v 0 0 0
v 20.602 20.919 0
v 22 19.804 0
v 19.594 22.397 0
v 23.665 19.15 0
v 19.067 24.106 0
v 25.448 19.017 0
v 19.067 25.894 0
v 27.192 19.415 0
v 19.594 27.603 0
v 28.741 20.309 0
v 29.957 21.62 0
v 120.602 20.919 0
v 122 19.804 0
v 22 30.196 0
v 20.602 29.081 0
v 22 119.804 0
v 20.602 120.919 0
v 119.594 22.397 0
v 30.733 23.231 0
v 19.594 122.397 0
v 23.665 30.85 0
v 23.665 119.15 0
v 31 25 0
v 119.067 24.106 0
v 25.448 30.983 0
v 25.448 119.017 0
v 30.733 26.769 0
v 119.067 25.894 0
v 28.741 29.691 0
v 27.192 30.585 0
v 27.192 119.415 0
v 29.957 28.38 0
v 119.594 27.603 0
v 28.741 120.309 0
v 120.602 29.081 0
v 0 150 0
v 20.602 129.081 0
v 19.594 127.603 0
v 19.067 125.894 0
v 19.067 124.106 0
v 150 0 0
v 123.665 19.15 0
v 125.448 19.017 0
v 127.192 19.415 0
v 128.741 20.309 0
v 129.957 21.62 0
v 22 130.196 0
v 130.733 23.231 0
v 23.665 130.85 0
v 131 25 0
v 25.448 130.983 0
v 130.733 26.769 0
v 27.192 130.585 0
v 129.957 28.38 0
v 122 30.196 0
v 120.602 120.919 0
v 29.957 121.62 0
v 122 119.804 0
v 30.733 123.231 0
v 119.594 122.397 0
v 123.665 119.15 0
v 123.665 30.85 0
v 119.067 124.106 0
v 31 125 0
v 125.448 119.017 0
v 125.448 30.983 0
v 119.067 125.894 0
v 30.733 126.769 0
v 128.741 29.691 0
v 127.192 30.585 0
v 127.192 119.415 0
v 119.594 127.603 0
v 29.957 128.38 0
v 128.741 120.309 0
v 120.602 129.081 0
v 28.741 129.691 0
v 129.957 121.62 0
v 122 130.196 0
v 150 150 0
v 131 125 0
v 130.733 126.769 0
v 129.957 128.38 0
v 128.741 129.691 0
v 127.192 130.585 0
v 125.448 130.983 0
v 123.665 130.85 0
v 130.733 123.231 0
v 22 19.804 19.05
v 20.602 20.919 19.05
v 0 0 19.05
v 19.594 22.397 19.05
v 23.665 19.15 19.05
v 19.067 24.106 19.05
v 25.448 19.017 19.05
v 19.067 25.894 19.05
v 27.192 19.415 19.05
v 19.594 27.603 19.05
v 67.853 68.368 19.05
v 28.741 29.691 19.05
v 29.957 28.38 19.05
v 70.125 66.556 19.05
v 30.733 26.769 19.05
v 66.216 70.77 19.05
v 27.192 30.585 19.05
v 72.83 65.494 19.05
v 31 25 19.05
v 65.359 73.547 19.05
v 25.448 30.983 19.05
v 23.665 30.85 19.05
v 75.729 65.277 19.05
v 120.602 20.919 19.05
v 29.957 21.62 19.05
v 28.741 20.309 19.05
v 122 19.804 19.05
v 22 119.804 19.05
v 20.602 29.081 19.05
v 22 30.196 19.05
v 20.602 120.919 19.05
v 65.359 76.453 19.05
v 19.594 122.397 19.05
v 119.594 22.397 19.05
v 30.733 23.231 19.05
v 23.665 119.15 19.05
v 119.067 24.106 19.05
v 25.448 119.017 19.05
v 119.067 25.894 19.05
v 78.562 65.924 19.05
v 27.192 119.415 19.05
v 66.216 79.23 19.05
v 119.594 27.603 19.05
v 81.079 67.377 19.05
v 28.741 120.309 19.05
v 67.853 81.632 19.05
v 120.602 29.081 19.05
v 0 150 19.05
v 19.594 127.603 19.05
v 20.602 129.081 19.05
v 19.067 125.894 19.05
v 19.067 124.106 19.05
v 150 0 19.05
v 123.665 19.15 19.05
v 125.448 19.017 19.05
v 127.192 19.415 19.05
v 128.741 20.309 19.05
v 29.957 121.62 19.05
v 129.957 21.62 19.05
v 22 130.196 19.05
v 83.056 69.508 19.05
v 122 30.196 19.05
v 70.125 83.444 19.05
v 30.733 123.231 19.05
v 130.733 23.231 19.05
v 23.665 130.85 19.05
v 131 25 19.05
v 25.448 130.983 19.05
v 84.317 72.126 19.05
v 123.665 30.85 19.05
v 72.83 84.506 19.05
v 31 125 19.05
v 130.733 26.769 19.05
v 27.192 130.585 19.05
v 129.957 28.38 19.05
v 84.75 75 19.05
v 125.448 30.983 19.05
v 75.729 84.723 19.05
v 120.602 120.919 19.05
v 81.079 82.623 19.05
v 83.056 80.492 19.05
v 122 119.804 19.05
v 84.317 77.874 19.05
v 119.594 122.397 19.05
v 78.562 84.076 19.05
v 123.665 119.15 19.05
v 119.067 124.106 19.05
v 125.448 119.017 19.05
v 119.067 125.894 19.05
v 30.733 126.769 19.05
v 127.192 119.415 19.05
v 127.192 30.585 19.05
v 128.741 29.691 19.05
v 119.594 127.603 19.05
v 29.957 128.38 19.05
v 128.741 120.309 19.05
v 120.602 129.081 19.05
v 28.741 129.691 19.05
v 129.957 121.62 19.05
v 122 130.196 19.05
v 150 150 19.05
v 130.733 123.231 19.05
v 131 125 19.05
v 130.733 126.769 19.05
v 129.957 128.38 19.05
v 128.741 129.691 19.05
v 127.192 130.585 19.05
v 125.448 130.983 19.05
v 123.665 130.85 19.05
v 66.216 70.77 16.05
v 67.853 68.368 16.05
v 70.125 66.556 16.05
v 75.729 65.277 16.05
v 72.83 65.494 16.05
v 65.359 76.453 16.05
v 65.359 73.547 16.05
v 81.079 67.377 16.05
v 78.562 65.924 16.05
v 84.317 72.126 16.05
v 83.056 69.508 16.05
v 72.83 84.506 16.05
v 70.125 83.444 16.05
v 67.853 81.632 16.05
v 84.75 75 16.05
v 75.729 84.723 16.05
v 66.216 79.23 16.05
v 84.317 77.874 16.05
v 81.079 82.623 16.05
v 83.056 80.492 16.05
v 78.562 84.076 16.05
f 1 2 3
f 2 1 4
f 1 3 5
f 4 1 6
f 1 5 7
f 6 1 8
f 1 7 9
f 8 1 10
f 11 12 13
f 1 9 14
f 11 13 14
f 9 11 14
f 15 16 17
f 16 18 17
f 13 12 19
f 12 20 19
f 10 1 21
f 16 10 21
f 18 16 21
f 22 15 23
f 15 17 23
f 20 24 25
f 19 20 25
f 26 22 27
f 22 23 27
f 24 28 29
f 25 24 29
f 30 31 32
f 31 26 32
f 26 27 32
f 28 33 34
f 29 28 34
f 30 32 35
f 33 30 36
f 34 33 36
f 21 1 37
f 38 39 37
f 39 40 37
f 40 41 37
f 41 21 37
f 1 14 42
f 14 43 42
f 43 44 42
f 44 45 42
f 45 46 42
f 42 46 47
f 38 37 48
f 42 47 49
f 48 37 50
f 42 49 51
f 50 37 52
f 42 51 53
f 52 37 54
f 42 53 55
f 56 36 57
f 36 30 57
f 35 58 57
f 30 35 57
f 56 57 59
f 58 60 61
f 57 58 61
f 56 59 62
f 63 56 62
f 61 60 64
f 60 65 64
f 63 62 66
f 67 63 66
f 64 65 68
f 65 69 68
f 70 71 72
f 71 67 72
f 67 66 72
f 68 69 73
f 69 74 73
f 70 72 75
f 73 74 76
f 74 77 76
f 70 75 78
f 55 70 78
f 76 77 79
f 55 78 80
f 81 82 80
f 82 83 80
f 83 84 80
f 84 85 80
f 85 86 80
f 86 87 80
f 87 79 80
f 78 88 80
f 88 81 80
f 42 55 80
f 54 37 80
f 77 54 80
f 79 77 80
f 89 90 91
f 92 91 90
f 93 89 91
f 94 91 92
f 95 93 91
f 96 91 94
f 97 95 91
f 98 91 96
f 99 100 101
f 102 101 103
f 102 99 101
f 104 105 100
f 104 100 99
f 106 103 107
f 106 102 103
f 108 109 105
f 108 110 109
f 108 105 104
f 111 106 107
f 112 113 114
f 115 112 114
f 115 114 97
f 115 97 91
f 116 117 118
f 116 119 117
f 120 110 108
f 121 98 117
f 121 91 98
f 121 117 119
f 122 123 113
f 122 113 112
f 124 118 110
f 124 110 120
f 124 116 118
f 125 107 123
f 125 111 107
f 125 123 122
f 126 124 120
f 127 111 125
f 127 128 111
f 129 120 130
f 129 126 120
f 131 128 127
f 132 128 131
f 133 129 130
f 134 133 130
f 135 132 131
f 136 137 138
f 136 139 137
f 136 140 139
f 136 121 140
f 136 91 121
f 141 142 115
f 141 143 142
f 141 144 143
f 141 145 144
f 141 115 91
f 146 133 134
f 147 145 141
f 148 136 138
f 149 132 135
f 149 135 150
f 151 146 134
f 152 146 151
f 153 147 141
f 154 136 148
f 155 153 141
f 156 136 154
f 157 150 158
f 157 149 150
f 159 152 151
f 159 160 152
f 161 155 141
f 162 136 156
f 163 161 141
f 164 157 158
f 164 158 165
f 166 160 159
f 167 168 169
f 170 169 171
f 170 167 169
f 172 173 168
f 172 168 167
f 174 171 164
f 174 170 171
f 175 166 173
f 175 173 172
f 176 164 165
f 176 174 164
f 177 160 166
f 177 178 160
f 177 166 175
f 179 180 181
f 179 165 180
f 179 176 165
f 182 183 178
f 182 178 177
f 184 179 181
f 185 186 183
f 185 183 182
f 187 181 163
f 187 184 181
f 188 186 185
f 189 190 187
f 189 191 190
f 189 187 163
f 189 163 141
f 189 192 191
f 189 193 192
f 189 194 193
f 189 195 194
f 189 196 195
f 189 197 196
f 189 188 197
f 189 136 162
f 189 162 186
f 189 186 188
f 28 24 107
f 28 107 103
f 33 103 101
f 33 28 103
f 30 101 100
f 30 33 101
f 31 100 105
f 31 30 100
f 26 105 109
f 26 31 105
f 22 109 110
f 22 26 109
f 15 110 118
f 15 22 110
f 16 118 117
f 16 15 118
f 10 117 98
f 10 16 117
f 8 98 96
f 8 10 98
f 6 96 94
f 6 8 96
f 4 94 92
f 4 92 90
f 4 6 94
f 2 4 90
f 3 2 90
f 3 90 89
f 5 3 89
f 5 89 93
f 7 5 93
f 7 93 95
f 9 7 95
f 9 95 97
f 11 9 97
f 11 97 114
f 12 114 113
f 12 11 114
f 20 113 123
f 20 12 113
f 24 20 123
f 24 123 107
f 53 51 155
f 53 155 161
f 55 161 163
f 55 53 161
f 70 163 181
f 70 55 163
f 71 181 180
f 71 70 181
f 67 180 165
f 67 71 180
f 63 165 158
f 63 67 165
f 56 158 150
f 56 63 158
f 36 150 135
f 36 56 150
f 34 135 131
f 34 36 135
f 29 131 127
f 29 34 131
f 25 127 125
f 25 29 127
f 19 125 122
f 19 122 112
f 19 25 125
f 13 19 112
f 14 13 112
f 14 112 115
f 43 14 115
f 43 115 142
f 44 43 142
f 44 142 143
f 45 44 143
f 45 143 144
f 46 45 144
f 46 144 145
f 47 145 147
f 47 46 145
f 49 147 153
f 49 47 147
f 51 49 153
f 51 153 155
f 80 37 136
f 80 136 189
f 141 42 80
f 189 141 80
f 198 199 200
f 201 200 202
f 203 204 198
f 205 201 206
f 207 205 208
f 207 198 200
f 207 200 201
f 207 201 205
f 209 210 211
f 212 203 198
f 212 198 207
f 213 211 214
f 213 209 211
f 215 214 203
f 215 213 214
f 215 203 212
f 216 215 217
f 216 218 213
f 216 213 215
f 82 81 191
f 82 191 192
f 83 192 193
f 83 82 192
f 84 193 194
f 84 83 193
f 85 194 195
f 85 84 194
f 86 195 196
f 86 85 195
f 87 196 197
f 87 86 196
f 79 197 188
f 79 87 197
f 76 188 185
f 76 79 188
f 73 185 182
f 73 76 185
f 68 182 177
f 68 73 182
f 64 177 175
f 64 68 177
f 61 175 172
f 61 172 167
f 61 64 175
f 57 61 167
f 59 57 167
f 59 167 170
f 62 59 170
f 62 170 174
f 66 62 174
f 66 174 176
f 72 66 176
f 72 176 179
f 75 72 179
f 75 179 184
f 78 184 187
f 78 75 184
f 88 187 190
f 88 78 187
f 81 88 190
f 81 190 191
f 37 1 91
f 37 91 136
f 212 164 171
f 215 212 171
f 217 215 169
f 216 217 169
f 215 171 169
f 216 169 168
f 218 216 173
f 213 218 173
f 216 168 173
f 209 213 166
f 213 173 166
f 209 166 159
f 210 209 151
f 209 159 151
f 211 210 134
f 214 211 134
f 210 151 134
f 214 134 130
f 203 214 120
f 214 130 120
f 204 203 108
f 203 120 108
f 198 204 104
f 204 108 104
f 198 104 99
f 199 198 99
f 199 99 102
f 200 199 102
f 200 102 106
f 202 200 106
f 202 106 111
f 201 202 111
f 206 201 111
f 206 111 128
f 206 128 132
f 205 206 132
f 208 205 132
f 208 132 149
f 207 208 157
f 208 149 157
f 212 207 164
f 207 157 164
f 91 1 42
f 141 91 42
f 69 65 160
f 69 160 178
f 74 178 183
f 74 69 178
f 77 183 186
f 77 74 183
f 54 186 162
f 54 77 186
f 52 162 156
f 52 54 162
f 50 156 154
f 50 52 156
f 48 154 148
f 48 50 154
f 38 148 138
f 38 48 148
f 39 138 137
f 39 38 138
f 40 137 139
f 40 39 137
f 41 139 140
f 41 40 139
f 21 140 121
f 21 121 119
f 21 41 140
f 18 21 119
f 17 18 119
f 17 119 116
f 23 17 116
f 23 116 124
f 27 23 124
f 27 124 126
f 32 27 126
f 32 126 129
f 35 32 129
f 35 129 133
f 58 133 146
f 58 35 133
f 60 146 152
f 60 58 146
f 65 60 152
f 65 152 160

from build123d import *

# Parameters (mm, degrees)
F0_W     = 150
F0_H     = 150
F0_R     = 6
F1_DEPTH = 19.05
F2_R     = 9.75
F3_DEPTH = 3


with BuildPart() as f1:
    # F0 (on Top) → F1 (new body)
    with BuildSketch(Plane.XY):
        with Locations((75, 75)):
            Rectangle(F0_W, F0_H)
        with Locations((25, 25)):
            Circle(F0_R, mode=Mode.SUBTRACT)
        with Locations((125, 25)):
            Circle(F0_R, mode=Mode.SUBTRACT)
        with Locations((25, 125)):
            Circle(F0_R, mode=Mode.SUBTRACT)
        with Locations((125, 125)):
            Circle(F0_R, mode=Mode.SUBTRACT)
    extrude(amount=F1_DEPTH)

    # F2 (on face) → F3 (cut)
    with BuildSketch(Plane.XY.offset(19.05)):
        with Locations((75, 75)):
            Circle(F2_R)
    extrude(amount=-F3_DEPTH, mode=Mode.SUBTRACT)


solid = f1.part
